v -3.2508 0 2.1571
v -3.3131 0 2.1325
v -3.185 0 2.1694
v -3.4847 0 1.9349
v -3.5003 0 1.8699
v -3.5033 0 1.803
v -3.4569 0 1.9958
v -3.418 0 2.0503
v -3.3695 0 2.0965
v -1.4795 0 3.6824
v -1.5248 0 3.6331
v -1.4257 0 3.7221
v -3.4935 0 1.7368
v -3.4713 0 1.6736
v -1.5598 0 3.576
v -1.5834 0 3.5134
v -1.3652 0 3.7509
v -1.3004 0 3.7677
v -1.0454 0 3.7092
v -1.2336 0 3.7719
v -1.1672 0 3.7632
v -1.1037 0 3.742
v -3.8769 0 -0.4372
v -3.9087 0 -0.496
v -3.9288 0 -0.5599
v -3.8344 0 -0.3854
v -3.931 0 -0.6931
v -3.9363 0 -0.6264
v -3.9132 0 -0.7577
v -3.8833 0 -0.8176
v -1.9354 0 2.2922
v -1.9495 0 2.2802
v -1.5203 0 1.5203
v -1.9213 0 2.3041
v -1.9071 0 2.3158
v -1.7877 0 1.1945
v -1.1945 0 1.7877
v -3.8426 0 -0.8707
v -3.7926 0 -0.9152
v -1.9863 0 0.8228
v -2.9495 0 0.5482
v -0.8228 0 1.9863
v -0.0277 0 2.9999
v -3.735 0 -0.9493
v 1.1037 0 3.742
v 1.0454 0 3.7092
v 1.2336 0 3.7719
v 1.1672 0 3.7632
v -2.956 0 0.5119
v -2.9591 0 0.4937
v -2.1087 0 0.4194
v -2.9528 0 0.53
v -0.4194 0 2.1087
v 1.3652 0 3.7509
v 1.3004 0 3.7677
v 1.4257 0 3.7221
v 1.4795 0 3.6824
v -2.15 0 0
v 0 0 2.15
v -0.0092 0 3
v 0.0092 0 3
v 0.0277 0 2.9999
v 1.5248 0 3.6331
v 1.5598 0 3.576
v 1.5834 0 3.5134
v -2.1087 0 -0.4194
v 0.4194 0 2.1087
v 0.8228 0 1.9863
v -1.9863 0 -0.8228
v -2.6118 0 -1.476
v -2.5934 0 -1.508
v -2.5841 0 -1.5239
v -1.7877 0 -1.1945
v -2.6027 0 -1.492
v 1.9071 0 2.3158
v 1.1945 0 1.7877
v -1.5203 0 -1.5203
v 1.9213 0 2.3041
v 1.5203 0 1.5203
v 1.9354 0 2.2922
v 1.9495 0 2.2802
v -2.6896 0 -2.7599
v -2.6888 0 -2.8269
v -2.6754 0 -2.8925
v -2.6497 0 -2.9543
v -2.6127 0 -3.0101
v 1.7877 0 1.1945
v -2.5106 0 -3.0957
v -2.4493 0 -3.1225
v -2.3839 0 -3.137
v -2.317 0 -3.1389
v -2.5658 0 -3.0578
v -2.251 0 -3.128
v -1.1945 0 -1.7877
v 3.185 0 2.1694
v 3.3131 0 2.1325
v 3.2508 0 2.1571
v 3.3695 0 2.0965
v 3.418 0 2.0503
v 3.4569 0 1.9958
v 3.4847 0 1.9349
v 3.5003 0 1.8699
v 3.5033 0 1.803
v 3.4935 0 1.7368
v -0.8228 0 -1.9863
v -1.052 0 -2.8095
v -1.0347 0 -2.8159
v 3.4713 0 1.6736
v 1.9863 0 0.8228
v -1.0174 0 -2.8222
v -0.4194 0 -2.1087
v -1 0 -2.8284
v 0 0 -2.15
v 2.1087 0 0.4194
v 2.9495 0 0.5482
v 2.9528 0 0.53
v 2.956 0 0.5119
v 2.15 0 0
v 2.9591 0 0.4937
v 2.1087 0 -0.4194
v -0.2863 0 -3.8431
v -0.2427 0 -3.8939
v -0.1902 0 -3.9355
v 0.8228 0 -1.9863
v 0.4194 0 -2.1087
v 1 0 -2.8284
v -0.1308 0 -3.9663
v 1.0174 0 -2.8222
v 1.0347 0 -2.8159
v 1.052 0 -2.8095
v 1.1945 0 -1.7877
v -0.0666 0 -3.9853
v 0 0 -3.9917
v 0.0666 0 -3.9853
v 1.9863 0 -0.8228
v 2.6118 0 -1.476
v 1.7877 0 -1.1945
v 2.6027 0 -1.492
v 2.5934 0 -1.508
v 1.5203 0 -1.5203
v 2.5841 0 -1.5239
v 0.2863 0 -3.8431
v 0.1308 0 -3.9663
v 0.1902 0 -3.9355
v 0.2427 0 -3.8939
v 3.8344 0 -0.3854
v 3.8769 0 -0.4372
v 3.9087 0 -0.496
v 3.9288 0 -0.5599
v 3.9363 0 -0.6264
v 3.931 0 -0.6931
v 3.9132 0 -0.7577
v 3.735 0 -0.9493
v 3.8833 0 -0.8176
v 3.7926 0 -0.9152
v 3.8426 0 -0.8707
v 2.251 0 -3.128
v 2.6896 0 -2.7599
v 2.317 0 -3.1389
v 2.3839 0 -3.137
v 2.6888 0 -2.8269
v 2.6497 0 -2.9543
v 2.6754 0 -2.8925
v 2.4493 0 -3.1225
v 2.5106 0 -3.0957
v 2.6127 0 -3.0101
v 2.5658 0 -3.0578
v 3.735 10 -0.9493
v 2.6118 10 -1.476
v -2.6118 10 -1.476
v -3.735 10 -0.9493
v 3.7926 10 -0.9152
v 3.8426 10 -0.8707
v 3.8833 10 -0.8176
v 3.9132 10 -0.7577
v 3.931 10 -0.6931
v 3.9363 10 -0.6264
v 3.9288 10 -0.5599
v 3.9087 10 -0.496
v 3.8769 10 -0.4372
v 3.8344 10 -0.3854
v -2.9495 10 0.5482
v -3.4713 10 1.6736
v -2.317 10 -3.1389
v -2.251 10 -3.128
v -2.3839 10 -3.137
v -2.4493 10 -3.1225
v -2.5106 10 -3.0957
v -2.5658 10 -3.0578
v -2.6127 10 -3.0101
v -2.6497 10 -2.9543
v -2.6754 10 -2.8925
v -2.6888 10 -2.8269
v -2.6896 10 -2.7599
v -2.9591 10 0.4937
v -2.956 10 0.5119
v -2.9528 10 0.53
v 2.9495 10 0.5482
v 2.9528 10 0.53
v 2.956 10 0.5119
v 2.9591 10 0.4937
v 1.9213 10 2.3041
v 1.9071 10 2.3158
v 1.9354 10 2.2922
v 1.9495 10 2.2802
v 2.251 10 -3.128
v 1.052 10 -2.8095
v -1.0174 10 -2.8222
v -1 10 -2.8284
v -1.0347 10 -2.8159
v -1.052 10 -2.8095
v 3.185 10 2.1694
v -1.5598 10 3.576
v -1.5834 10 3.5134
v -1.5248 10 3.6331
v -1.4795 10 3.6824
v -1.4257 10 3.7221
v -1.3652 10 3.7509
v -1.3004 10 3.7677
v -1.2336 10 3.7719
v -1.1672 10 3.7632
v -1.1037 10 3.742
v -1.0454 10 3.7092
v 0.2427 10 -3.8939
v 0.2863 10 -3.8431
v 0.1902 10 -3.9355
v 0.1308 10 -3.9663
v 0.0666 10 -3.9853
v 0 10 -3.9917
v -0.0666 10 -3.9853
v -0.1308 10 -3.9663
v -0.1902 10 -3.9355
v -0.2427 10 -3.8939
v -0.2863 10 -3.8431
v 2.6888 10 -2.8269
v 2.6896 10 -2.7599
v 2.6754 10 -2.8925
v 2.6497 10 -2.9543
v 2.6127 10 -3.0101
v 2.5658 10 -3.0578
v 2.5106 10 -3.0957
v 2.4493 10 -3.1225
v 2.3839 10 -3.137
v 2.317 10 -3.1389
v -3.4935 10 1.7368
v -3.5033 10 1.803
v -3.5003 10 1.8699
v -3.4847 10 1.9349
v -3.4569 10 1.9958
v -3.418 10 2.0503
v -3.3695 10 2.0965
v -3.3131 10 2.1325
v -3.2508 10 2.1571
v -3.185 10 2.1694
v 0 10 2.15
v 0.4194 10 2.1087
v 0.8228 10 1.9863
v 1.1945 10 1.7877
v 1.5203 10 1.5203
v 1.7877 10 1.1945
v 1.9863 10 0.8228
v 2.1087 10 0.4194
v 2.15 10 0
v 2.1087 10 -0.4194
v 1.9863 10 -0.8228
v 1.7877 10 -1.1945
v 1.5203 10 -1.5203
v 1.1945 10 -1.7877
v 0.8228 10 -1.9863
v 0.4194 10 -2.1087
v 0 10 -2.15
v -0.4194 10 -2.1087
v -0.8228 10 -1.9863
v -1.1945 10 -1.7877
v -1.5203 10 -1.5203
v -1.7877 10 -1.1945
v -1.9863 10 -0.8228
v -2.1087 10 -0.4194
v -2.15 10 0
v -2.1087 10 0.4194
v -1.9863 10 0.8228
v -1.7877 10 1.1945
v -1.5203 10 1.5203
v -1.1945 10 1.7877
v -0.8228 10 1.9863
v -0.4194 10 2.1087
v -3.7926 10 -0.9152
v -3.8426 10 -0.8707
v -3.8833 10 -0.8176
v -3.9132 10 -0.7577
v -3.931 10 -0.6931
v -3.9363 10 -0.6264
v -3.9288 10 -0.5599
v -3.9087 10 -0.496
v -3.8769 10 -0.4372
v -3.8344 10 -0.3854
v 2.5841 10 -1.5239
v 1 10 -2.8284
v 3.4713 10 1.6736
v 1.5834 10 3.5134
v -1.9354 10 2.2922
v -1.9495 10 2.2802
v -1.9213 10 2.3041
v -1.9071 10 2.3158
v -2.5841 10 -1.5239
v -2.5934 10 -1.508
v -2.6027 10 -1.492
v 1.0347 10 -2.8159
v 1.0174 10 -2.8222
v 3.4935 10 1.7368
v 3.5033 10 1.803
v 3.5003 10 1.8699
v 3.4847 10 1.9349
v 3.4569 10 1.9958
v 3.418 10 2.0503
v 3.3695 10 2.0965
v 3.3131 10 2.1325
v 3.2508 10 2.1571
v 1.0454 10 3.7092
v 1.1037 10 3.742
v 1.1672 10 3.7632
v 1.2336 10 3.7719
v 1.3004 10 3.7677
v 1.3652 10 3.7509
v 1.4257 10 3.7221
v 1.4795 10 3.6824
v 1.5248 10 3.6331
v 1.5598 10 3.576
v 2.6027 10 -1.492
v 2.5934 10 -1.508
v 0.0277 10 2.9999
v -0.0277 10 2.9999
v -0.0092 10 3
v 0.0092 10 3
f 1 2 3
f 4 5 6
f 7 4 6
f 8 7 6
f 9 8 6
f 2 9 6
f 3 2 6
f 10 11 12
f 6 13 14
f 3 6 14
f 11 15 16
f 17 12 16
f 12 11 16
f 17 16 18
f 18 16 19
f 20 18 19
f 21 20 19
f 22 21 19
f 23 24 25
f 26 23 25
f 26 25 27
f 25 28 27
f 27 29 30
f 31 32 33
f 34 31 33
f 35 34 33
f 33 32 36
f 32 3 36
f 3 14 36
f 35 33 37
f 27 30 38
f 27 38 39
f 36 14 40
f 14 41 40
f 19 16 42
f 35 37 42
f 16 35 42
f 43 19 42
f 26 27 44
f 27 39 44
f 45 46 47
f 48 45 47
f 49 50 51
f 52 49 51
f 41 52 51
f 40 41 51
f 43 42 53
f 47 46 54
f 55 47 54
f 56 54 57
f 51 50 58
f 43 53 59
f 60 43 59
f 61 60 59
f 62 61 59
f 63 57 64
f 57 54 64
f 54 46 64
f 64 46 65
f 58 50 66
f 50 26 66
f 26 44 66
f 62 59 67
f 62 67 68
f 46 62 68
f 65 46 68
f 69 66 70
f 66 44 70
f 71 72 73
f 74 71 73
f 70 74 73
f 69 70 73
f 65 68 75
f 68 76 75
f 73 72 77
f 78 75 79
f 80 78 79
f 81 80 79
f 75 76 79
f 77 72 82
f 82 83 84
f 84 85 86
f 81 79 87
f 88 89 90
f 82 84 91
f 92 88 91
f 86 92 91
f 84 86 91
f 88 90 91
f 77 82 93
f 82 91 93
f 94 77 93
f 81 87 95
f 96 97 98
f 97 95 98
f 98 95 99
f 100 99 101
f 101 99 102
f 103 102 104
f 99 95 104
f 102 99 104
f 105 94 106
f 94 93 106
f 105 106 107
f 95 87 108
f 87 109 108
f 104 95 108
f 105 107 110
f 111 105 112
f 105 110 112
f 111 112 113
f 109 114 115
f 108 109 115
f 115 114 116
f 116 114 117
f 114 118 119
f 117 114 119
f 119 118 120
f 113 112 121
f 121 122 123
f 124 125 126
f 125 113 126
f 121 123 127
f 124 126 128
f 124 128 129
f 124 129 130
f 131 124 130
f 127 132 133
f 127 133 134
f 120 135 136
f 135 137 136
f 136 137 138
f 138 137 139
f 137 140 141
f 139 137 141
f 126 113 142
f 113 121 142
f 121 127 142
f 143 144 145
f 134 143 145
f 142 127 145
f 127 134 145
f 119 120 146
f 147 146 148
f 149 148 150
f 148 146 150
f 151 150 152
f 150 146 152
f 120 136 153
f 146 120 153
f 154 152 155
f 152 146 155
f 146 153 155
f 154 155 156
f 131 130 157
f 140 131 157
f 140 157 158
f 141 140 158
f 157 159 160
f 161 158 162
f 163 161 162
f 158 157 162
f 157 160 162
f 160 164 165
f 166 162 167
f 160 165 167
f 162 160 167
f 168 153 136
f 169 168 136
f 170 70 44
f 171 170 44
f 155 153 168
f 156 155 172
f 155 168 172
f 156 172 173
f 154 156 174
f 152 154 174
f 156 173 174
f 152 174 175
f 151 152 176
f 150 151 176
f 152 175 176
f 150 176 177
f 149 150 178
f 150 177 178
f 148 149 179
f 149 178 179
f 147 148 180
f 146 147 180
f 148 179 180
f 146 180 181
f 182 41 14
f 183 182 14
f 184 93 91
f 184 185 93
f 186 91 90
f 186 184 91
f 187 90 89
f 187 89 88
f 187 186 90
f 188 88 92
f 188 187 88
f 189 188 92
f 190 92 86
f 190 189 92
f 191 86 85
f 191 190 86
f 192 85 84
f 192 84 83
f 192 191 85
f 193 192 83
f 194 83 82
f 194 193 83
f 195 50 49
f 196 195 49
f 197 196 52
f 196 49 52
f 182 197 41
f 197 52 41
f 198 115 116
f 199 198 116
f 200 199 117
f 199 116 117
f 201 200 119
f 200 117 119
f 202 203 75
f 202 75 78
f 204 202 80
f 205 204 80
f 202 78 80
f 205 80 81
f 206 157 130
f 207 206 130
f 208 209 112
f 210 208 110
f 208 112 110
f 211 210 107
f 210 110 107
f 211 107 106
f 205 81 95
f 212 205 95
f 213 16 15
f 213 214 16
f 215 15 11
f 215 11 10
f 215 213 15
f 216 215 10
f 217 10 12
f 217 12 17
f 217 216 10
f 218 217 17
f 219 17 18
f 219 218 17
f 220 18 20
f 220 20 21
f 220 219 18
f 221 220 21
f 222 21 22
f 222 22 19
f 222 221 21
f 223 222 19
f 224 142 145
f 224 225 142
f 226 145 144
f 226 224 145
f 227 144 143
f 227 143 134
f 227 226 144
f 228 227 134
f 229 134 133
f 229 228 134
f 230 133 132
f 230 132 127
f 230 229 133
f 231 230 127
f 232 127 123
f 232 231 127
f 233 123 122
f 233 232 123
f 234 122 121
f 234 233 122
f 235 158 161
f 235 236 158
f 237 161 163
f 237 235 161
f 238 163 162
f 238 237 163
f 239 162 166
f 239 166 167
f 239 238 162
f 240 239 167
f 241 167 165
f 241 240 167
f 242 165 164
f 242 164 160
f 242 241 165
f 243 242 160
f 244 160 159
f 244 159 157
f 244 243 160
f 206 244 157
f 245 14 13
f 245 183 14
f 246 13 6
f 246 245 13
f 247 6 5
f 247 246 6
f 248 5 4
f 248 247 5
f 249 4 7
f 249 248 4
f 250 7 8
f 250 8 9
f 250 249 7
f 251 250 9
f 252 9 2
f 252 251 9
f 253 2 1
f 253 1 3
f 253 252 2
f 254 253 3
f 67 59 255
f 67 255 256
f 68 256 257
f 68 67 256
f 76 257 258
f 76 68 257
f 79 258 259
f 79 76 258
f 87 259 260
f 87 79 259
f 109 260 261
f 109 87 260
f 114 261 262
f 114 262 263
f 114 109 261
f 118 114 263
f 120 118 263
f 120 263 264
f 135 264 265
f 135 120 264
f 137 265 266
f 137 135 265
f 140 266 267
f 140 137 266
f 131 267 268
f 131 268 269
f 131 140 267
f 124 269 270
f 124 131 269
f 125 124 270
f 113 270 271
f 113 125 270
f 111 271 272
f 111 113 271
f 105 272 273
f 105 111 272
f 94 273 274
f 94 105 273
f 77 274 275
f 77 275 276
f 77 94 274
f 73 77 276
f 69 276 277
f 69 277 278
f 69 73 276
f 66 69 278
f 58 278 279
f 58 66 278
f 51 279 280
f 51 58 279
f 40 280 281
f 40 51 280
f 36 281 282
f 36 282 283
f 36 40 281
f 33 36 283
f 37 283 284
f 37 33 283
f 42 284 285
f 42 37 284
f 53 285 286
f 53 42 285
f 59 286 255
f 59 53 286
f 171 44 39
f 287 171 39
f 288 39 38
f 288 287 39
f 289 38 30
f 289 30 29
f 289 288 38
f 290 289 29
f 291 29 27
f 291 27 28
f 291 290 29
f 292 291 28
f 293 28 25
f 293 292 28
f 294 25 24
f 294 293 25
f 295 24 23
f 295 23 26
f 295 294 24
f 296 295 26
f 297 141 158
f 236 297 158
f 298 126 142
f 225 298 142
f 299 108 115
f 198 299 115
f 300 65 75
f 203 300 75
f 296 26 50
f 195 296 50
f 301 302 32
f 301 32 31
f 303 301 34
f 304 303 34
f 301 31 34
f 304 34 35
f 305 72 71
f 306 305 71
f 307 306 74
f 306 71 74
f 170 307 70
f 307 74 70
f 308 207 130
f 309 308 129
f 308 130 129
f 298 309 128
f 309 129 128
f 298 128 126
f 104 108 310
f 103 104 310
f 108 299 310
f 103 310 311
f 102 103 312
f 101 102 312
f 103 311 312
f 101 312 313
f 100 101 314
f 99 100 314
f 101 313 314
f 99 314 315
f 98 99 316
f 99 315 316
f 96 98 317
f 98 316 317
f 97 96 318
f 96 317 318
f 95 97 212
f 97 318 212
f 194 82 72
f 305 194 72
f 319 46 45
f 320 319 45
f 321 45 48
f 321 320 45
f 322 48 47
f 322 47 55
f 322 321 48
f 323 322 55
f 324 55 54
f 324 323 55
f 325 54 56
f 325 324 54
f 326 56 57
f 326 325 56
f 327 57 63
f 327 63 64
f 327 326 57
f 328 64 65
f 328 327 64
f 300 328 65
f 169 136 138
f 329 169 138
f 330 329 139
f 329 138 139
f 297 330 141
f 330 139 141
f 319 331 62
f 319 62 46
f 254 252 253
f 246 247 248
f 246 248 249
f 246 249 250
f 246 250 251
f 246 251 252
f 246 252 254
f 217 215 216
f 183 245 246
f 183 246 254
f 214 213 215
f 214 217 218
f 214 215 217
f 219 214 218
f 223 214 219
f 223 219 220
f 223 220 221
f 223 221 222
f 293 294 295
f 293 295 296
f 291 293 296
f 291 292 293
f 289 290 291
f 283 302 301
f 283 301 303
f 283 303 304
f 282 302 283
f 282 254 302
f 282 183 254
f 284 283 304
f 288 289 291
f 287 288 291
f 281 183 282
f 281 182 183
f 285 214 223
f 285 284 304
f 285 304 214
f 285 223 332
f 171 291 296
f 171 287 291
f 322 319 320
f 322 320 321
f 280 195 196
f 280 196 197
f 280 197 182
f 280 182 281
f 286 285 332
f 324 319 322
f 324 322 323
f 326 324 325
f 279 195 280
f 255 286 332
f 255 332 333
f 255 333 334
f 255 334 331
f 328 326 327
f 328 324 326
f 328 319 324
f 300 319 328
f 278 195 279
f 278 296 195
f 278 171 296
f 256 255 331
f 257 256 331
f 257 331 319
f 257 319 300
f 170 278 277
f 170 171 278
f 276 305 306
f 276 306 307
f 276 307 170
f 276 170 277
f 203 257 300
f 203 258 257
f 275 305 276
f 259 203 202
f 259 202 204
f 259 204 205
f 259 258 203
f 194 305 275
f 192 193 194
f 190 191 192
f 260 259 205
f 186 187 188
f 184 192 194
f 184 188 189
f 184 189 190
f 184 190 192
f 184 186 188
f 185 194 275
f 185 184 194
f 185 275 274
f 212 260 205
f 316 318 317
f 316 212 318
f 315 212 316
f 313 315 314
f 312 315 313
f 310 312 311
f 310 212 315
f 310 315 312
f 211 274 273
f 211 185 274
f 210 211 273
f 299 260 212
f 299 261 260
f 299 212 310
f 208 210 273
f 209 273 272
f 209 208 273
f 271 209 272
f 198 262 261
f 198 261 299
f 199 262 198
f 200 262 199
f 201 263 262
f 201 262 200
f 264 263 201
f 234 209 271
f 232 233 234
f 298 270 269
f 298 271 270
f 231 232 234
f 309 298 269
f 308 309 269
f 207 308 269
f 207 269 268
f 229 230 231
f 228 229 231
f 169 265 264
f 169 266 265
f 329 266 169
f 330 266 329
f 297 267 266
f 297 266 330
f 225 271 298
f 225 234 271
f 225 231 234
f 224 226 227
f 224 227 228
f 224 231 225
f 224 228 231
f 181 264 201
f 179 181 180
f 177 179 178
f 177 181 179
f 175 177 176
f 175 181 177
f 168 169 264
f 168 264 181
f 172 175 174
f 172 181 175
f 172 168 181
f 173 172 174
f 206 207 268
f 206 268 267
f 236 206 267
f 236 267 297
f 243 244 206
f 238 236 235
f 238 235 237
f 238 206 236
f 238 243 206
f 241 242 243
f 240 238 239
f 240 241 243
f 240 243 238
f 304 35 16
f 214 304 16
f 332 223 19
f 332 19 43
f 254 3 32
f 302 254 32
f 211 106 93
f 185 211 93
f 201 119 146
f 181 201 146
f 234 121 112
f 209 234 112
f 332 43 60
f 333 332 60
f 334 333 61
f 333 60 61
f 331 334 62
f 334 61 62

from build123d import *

# Parameters (mm, degrees)
SKETCH1_R           = 3
SKETCH1_R_2         = 2.15
BOSS_EXTRUDE1_DEPTH = 10
FILLET1_R           = 0.35


with BuildPart() as part:
    # Sketch1 → Boss-Extrude1 (new body)
    # profile 1 of 10: a face of its own
    with BuildSketch(Plane(origin=(0, 0, 0), x_dir=(1, 0, 0), z_dir=(0, 1, 0))):
        with BuildLine():
            Line((1, 2.828427125), (0, 4.25))
            Line((0, 4.25), (-1, 2.828427125))
            ThreePointArc((-1, 2.828427125), (0, 3), (1, 2.828427125))
        make_face()
    # profile 2 of 10: a face of its own
    with BuildSketch(Plane(origin=(0, 0, 0), x_dir=(1, 0, 0), z_dir=(0, 1, 0))):
        with BuildLine():
            Line((2.731847341, 3.255688883), (1.052033468, 2.809488491))
            ThreePointArc((1.052033468, 2.809488491), (1.928362829, 2.298133329), (2.584122354, 1.523913272))
            Line((2.584122354, 1.523913272), (2.731847341, 3.255688883))
        make_face()
    # profile 3 of 10: a face of its own
    with BuildSketch(Plane(origin=(0, 0, 0), x_dir=(1, 0, 0), z_dir=(0, 1, 0))):
        with BuildLine():
            Line((4.18543295, 0.738004755), (2.611808784, 1.475958969))
            ThreePointArc((2.611808784, 1.475958969), (2.901329553, 0.763077207), (3, 0))
            ThreePointArc((3, 0), (2.989758804, -0.24767376), (2.959105139, -0.493656537))
            Line((2.959105139, -0.493656537), (4.18543295, 0.738004755))
        make_face()
    # profile 4 of 10: a face of its own
    with BuildSketch(Plane(origin=(0, 0, 0), x_dir=(1, 0, 0), z_dir=(0, 1, 0))):
        with BuildLine():
            Line((3.680607966, -2.125), (2.949489743, -0.548188159))
            ThreePointArc((2.949489743, -0.548188159), (2.598076211, -1.5), (1.949489743, -2.280238966))
            Line((1.949489743, -2.280238966), (3.680607966, -2.125))
        make_face()
    # profile 5 of 10: a face of its own
    with BuildSketch(Plane(origin=(0, 0, 0), x_dir=(1, 0, 0), z_dir=(0, 1, 0))):
        with BuildLine():
            Line((1.453585609, -3.993693638), (1.907071671, -2.315831954))
            ThreePointArc((1.907071671, -2.315831954), (1.02606043, -2.819077862), (0.02768643, -2.999872241))
            Line((0.02768643, -2.999872241), (1.453585609, -3.993693638))
        make_face()
    # profile 6 of 10: a face of its own
    with BuildSketch(Plane(origin=(0, 0, 0), x_dir=(1, 0, 0), z_dir=(0, 1, 0))):
        with BuildLine():
            ThreePointArc((-0.02768643, -2.999872241), (-1.02606043, -2.819077862), (-1.907071671, -2.315831954))
            Line((-1.907071671, -2.315831954), (-1.453585609, -3.993693638))
            Line((-1.453585609, -3.993693638), (-0.02768643, -2.999872241))
        make_face()
    # profile 7 of 10: a face of its own
    with BuildSketch(Plane(origin=(0, 0, 0), x_dir=(1, 0, 0), z_dir=(0, 1, 0))):
        Circle(SKETCH1_R)
        with Locations(Location((0, 0, 0), (0, 0, 270))):
            Circle(SKETCH1_R_2, mode=Mode.SUBTRACT)
    # profile 8 of 10: a face of its own
    with BuildSketch(Plane(origin=(0, 0, 0), x_dir=(1, 0, 0), z_dir=(0, 1, 0))):
        with BuildLine():
            ThreePointArc((-1.949489743, -2.280238966), (-2.598076211, -1.5), (-2.949489743, -0.548188159))
            Line((-2.949489743, -0.548188159), (-3.680607966, -2.125))
            Line((-3.680607966, -2.125), (-1.949489743, -2.280238966))
        make_face()
    # profile 9 of 10: a face of its own
    with BuildSketch(Plane(origin=(0, 0, 0), x_dir=(1, 0, 0), z_dir=(0, 1, 0))):
        with BuildLine():
            ThreePointArc((-2.959105139, -0.493656537), (-2.954423259, 0.520944533), (-2.611808784, 1.475958969))
            Line((-2.611808784, 1.475958969), (-4.18543295, 0.738004755))
            Line((-4.18543295, 0.738004755), (-2.959105139, -0.493656537))
        make_face()
    # profile 10 of 10: a face of its own
    with BuildSketch(Plane(origin=(0, 0, 0), x_dir=(1, 0, 0), z_dir=(0, 1, 0))):
        with BuildLine():
            ThreePointArc((-2.584122354, 1.523913272), (-1.928362829, 2.298133329), (-1.052033468, 2.809488491))
            Line((-1.052033468, 2.809488491), (-2.731847341, 3.255688883))
            Line((-2.731847341, 3.255688883), (-2.584122354, 1.523913272))
        make_face()
    extrude(amount=BOSS_EXTRUDE1_DEPTH)

    # Fillet1
    fillet1_edges = [part.edges().sort_by_distance(p)[0] for p in [
        (0, 5, -4.25),
        (2.731847341, 5, -3.255688883),
        (4.18543295, 5, -0.738004755),
        (3.680607966, 5, 2.125),
        (1.453585609, 5, 3.993693638),
        (-1.453585609, 5, 3.993693638),
        (-3.680607966, 5, 2.125),
        (-4.18543295, 5, -0.738004755),
        (-2.731847341, 5, -3.255688883),
    ]]
    fillet(fillet1_edges, radius=FILLET1_R)


solid = part.part
